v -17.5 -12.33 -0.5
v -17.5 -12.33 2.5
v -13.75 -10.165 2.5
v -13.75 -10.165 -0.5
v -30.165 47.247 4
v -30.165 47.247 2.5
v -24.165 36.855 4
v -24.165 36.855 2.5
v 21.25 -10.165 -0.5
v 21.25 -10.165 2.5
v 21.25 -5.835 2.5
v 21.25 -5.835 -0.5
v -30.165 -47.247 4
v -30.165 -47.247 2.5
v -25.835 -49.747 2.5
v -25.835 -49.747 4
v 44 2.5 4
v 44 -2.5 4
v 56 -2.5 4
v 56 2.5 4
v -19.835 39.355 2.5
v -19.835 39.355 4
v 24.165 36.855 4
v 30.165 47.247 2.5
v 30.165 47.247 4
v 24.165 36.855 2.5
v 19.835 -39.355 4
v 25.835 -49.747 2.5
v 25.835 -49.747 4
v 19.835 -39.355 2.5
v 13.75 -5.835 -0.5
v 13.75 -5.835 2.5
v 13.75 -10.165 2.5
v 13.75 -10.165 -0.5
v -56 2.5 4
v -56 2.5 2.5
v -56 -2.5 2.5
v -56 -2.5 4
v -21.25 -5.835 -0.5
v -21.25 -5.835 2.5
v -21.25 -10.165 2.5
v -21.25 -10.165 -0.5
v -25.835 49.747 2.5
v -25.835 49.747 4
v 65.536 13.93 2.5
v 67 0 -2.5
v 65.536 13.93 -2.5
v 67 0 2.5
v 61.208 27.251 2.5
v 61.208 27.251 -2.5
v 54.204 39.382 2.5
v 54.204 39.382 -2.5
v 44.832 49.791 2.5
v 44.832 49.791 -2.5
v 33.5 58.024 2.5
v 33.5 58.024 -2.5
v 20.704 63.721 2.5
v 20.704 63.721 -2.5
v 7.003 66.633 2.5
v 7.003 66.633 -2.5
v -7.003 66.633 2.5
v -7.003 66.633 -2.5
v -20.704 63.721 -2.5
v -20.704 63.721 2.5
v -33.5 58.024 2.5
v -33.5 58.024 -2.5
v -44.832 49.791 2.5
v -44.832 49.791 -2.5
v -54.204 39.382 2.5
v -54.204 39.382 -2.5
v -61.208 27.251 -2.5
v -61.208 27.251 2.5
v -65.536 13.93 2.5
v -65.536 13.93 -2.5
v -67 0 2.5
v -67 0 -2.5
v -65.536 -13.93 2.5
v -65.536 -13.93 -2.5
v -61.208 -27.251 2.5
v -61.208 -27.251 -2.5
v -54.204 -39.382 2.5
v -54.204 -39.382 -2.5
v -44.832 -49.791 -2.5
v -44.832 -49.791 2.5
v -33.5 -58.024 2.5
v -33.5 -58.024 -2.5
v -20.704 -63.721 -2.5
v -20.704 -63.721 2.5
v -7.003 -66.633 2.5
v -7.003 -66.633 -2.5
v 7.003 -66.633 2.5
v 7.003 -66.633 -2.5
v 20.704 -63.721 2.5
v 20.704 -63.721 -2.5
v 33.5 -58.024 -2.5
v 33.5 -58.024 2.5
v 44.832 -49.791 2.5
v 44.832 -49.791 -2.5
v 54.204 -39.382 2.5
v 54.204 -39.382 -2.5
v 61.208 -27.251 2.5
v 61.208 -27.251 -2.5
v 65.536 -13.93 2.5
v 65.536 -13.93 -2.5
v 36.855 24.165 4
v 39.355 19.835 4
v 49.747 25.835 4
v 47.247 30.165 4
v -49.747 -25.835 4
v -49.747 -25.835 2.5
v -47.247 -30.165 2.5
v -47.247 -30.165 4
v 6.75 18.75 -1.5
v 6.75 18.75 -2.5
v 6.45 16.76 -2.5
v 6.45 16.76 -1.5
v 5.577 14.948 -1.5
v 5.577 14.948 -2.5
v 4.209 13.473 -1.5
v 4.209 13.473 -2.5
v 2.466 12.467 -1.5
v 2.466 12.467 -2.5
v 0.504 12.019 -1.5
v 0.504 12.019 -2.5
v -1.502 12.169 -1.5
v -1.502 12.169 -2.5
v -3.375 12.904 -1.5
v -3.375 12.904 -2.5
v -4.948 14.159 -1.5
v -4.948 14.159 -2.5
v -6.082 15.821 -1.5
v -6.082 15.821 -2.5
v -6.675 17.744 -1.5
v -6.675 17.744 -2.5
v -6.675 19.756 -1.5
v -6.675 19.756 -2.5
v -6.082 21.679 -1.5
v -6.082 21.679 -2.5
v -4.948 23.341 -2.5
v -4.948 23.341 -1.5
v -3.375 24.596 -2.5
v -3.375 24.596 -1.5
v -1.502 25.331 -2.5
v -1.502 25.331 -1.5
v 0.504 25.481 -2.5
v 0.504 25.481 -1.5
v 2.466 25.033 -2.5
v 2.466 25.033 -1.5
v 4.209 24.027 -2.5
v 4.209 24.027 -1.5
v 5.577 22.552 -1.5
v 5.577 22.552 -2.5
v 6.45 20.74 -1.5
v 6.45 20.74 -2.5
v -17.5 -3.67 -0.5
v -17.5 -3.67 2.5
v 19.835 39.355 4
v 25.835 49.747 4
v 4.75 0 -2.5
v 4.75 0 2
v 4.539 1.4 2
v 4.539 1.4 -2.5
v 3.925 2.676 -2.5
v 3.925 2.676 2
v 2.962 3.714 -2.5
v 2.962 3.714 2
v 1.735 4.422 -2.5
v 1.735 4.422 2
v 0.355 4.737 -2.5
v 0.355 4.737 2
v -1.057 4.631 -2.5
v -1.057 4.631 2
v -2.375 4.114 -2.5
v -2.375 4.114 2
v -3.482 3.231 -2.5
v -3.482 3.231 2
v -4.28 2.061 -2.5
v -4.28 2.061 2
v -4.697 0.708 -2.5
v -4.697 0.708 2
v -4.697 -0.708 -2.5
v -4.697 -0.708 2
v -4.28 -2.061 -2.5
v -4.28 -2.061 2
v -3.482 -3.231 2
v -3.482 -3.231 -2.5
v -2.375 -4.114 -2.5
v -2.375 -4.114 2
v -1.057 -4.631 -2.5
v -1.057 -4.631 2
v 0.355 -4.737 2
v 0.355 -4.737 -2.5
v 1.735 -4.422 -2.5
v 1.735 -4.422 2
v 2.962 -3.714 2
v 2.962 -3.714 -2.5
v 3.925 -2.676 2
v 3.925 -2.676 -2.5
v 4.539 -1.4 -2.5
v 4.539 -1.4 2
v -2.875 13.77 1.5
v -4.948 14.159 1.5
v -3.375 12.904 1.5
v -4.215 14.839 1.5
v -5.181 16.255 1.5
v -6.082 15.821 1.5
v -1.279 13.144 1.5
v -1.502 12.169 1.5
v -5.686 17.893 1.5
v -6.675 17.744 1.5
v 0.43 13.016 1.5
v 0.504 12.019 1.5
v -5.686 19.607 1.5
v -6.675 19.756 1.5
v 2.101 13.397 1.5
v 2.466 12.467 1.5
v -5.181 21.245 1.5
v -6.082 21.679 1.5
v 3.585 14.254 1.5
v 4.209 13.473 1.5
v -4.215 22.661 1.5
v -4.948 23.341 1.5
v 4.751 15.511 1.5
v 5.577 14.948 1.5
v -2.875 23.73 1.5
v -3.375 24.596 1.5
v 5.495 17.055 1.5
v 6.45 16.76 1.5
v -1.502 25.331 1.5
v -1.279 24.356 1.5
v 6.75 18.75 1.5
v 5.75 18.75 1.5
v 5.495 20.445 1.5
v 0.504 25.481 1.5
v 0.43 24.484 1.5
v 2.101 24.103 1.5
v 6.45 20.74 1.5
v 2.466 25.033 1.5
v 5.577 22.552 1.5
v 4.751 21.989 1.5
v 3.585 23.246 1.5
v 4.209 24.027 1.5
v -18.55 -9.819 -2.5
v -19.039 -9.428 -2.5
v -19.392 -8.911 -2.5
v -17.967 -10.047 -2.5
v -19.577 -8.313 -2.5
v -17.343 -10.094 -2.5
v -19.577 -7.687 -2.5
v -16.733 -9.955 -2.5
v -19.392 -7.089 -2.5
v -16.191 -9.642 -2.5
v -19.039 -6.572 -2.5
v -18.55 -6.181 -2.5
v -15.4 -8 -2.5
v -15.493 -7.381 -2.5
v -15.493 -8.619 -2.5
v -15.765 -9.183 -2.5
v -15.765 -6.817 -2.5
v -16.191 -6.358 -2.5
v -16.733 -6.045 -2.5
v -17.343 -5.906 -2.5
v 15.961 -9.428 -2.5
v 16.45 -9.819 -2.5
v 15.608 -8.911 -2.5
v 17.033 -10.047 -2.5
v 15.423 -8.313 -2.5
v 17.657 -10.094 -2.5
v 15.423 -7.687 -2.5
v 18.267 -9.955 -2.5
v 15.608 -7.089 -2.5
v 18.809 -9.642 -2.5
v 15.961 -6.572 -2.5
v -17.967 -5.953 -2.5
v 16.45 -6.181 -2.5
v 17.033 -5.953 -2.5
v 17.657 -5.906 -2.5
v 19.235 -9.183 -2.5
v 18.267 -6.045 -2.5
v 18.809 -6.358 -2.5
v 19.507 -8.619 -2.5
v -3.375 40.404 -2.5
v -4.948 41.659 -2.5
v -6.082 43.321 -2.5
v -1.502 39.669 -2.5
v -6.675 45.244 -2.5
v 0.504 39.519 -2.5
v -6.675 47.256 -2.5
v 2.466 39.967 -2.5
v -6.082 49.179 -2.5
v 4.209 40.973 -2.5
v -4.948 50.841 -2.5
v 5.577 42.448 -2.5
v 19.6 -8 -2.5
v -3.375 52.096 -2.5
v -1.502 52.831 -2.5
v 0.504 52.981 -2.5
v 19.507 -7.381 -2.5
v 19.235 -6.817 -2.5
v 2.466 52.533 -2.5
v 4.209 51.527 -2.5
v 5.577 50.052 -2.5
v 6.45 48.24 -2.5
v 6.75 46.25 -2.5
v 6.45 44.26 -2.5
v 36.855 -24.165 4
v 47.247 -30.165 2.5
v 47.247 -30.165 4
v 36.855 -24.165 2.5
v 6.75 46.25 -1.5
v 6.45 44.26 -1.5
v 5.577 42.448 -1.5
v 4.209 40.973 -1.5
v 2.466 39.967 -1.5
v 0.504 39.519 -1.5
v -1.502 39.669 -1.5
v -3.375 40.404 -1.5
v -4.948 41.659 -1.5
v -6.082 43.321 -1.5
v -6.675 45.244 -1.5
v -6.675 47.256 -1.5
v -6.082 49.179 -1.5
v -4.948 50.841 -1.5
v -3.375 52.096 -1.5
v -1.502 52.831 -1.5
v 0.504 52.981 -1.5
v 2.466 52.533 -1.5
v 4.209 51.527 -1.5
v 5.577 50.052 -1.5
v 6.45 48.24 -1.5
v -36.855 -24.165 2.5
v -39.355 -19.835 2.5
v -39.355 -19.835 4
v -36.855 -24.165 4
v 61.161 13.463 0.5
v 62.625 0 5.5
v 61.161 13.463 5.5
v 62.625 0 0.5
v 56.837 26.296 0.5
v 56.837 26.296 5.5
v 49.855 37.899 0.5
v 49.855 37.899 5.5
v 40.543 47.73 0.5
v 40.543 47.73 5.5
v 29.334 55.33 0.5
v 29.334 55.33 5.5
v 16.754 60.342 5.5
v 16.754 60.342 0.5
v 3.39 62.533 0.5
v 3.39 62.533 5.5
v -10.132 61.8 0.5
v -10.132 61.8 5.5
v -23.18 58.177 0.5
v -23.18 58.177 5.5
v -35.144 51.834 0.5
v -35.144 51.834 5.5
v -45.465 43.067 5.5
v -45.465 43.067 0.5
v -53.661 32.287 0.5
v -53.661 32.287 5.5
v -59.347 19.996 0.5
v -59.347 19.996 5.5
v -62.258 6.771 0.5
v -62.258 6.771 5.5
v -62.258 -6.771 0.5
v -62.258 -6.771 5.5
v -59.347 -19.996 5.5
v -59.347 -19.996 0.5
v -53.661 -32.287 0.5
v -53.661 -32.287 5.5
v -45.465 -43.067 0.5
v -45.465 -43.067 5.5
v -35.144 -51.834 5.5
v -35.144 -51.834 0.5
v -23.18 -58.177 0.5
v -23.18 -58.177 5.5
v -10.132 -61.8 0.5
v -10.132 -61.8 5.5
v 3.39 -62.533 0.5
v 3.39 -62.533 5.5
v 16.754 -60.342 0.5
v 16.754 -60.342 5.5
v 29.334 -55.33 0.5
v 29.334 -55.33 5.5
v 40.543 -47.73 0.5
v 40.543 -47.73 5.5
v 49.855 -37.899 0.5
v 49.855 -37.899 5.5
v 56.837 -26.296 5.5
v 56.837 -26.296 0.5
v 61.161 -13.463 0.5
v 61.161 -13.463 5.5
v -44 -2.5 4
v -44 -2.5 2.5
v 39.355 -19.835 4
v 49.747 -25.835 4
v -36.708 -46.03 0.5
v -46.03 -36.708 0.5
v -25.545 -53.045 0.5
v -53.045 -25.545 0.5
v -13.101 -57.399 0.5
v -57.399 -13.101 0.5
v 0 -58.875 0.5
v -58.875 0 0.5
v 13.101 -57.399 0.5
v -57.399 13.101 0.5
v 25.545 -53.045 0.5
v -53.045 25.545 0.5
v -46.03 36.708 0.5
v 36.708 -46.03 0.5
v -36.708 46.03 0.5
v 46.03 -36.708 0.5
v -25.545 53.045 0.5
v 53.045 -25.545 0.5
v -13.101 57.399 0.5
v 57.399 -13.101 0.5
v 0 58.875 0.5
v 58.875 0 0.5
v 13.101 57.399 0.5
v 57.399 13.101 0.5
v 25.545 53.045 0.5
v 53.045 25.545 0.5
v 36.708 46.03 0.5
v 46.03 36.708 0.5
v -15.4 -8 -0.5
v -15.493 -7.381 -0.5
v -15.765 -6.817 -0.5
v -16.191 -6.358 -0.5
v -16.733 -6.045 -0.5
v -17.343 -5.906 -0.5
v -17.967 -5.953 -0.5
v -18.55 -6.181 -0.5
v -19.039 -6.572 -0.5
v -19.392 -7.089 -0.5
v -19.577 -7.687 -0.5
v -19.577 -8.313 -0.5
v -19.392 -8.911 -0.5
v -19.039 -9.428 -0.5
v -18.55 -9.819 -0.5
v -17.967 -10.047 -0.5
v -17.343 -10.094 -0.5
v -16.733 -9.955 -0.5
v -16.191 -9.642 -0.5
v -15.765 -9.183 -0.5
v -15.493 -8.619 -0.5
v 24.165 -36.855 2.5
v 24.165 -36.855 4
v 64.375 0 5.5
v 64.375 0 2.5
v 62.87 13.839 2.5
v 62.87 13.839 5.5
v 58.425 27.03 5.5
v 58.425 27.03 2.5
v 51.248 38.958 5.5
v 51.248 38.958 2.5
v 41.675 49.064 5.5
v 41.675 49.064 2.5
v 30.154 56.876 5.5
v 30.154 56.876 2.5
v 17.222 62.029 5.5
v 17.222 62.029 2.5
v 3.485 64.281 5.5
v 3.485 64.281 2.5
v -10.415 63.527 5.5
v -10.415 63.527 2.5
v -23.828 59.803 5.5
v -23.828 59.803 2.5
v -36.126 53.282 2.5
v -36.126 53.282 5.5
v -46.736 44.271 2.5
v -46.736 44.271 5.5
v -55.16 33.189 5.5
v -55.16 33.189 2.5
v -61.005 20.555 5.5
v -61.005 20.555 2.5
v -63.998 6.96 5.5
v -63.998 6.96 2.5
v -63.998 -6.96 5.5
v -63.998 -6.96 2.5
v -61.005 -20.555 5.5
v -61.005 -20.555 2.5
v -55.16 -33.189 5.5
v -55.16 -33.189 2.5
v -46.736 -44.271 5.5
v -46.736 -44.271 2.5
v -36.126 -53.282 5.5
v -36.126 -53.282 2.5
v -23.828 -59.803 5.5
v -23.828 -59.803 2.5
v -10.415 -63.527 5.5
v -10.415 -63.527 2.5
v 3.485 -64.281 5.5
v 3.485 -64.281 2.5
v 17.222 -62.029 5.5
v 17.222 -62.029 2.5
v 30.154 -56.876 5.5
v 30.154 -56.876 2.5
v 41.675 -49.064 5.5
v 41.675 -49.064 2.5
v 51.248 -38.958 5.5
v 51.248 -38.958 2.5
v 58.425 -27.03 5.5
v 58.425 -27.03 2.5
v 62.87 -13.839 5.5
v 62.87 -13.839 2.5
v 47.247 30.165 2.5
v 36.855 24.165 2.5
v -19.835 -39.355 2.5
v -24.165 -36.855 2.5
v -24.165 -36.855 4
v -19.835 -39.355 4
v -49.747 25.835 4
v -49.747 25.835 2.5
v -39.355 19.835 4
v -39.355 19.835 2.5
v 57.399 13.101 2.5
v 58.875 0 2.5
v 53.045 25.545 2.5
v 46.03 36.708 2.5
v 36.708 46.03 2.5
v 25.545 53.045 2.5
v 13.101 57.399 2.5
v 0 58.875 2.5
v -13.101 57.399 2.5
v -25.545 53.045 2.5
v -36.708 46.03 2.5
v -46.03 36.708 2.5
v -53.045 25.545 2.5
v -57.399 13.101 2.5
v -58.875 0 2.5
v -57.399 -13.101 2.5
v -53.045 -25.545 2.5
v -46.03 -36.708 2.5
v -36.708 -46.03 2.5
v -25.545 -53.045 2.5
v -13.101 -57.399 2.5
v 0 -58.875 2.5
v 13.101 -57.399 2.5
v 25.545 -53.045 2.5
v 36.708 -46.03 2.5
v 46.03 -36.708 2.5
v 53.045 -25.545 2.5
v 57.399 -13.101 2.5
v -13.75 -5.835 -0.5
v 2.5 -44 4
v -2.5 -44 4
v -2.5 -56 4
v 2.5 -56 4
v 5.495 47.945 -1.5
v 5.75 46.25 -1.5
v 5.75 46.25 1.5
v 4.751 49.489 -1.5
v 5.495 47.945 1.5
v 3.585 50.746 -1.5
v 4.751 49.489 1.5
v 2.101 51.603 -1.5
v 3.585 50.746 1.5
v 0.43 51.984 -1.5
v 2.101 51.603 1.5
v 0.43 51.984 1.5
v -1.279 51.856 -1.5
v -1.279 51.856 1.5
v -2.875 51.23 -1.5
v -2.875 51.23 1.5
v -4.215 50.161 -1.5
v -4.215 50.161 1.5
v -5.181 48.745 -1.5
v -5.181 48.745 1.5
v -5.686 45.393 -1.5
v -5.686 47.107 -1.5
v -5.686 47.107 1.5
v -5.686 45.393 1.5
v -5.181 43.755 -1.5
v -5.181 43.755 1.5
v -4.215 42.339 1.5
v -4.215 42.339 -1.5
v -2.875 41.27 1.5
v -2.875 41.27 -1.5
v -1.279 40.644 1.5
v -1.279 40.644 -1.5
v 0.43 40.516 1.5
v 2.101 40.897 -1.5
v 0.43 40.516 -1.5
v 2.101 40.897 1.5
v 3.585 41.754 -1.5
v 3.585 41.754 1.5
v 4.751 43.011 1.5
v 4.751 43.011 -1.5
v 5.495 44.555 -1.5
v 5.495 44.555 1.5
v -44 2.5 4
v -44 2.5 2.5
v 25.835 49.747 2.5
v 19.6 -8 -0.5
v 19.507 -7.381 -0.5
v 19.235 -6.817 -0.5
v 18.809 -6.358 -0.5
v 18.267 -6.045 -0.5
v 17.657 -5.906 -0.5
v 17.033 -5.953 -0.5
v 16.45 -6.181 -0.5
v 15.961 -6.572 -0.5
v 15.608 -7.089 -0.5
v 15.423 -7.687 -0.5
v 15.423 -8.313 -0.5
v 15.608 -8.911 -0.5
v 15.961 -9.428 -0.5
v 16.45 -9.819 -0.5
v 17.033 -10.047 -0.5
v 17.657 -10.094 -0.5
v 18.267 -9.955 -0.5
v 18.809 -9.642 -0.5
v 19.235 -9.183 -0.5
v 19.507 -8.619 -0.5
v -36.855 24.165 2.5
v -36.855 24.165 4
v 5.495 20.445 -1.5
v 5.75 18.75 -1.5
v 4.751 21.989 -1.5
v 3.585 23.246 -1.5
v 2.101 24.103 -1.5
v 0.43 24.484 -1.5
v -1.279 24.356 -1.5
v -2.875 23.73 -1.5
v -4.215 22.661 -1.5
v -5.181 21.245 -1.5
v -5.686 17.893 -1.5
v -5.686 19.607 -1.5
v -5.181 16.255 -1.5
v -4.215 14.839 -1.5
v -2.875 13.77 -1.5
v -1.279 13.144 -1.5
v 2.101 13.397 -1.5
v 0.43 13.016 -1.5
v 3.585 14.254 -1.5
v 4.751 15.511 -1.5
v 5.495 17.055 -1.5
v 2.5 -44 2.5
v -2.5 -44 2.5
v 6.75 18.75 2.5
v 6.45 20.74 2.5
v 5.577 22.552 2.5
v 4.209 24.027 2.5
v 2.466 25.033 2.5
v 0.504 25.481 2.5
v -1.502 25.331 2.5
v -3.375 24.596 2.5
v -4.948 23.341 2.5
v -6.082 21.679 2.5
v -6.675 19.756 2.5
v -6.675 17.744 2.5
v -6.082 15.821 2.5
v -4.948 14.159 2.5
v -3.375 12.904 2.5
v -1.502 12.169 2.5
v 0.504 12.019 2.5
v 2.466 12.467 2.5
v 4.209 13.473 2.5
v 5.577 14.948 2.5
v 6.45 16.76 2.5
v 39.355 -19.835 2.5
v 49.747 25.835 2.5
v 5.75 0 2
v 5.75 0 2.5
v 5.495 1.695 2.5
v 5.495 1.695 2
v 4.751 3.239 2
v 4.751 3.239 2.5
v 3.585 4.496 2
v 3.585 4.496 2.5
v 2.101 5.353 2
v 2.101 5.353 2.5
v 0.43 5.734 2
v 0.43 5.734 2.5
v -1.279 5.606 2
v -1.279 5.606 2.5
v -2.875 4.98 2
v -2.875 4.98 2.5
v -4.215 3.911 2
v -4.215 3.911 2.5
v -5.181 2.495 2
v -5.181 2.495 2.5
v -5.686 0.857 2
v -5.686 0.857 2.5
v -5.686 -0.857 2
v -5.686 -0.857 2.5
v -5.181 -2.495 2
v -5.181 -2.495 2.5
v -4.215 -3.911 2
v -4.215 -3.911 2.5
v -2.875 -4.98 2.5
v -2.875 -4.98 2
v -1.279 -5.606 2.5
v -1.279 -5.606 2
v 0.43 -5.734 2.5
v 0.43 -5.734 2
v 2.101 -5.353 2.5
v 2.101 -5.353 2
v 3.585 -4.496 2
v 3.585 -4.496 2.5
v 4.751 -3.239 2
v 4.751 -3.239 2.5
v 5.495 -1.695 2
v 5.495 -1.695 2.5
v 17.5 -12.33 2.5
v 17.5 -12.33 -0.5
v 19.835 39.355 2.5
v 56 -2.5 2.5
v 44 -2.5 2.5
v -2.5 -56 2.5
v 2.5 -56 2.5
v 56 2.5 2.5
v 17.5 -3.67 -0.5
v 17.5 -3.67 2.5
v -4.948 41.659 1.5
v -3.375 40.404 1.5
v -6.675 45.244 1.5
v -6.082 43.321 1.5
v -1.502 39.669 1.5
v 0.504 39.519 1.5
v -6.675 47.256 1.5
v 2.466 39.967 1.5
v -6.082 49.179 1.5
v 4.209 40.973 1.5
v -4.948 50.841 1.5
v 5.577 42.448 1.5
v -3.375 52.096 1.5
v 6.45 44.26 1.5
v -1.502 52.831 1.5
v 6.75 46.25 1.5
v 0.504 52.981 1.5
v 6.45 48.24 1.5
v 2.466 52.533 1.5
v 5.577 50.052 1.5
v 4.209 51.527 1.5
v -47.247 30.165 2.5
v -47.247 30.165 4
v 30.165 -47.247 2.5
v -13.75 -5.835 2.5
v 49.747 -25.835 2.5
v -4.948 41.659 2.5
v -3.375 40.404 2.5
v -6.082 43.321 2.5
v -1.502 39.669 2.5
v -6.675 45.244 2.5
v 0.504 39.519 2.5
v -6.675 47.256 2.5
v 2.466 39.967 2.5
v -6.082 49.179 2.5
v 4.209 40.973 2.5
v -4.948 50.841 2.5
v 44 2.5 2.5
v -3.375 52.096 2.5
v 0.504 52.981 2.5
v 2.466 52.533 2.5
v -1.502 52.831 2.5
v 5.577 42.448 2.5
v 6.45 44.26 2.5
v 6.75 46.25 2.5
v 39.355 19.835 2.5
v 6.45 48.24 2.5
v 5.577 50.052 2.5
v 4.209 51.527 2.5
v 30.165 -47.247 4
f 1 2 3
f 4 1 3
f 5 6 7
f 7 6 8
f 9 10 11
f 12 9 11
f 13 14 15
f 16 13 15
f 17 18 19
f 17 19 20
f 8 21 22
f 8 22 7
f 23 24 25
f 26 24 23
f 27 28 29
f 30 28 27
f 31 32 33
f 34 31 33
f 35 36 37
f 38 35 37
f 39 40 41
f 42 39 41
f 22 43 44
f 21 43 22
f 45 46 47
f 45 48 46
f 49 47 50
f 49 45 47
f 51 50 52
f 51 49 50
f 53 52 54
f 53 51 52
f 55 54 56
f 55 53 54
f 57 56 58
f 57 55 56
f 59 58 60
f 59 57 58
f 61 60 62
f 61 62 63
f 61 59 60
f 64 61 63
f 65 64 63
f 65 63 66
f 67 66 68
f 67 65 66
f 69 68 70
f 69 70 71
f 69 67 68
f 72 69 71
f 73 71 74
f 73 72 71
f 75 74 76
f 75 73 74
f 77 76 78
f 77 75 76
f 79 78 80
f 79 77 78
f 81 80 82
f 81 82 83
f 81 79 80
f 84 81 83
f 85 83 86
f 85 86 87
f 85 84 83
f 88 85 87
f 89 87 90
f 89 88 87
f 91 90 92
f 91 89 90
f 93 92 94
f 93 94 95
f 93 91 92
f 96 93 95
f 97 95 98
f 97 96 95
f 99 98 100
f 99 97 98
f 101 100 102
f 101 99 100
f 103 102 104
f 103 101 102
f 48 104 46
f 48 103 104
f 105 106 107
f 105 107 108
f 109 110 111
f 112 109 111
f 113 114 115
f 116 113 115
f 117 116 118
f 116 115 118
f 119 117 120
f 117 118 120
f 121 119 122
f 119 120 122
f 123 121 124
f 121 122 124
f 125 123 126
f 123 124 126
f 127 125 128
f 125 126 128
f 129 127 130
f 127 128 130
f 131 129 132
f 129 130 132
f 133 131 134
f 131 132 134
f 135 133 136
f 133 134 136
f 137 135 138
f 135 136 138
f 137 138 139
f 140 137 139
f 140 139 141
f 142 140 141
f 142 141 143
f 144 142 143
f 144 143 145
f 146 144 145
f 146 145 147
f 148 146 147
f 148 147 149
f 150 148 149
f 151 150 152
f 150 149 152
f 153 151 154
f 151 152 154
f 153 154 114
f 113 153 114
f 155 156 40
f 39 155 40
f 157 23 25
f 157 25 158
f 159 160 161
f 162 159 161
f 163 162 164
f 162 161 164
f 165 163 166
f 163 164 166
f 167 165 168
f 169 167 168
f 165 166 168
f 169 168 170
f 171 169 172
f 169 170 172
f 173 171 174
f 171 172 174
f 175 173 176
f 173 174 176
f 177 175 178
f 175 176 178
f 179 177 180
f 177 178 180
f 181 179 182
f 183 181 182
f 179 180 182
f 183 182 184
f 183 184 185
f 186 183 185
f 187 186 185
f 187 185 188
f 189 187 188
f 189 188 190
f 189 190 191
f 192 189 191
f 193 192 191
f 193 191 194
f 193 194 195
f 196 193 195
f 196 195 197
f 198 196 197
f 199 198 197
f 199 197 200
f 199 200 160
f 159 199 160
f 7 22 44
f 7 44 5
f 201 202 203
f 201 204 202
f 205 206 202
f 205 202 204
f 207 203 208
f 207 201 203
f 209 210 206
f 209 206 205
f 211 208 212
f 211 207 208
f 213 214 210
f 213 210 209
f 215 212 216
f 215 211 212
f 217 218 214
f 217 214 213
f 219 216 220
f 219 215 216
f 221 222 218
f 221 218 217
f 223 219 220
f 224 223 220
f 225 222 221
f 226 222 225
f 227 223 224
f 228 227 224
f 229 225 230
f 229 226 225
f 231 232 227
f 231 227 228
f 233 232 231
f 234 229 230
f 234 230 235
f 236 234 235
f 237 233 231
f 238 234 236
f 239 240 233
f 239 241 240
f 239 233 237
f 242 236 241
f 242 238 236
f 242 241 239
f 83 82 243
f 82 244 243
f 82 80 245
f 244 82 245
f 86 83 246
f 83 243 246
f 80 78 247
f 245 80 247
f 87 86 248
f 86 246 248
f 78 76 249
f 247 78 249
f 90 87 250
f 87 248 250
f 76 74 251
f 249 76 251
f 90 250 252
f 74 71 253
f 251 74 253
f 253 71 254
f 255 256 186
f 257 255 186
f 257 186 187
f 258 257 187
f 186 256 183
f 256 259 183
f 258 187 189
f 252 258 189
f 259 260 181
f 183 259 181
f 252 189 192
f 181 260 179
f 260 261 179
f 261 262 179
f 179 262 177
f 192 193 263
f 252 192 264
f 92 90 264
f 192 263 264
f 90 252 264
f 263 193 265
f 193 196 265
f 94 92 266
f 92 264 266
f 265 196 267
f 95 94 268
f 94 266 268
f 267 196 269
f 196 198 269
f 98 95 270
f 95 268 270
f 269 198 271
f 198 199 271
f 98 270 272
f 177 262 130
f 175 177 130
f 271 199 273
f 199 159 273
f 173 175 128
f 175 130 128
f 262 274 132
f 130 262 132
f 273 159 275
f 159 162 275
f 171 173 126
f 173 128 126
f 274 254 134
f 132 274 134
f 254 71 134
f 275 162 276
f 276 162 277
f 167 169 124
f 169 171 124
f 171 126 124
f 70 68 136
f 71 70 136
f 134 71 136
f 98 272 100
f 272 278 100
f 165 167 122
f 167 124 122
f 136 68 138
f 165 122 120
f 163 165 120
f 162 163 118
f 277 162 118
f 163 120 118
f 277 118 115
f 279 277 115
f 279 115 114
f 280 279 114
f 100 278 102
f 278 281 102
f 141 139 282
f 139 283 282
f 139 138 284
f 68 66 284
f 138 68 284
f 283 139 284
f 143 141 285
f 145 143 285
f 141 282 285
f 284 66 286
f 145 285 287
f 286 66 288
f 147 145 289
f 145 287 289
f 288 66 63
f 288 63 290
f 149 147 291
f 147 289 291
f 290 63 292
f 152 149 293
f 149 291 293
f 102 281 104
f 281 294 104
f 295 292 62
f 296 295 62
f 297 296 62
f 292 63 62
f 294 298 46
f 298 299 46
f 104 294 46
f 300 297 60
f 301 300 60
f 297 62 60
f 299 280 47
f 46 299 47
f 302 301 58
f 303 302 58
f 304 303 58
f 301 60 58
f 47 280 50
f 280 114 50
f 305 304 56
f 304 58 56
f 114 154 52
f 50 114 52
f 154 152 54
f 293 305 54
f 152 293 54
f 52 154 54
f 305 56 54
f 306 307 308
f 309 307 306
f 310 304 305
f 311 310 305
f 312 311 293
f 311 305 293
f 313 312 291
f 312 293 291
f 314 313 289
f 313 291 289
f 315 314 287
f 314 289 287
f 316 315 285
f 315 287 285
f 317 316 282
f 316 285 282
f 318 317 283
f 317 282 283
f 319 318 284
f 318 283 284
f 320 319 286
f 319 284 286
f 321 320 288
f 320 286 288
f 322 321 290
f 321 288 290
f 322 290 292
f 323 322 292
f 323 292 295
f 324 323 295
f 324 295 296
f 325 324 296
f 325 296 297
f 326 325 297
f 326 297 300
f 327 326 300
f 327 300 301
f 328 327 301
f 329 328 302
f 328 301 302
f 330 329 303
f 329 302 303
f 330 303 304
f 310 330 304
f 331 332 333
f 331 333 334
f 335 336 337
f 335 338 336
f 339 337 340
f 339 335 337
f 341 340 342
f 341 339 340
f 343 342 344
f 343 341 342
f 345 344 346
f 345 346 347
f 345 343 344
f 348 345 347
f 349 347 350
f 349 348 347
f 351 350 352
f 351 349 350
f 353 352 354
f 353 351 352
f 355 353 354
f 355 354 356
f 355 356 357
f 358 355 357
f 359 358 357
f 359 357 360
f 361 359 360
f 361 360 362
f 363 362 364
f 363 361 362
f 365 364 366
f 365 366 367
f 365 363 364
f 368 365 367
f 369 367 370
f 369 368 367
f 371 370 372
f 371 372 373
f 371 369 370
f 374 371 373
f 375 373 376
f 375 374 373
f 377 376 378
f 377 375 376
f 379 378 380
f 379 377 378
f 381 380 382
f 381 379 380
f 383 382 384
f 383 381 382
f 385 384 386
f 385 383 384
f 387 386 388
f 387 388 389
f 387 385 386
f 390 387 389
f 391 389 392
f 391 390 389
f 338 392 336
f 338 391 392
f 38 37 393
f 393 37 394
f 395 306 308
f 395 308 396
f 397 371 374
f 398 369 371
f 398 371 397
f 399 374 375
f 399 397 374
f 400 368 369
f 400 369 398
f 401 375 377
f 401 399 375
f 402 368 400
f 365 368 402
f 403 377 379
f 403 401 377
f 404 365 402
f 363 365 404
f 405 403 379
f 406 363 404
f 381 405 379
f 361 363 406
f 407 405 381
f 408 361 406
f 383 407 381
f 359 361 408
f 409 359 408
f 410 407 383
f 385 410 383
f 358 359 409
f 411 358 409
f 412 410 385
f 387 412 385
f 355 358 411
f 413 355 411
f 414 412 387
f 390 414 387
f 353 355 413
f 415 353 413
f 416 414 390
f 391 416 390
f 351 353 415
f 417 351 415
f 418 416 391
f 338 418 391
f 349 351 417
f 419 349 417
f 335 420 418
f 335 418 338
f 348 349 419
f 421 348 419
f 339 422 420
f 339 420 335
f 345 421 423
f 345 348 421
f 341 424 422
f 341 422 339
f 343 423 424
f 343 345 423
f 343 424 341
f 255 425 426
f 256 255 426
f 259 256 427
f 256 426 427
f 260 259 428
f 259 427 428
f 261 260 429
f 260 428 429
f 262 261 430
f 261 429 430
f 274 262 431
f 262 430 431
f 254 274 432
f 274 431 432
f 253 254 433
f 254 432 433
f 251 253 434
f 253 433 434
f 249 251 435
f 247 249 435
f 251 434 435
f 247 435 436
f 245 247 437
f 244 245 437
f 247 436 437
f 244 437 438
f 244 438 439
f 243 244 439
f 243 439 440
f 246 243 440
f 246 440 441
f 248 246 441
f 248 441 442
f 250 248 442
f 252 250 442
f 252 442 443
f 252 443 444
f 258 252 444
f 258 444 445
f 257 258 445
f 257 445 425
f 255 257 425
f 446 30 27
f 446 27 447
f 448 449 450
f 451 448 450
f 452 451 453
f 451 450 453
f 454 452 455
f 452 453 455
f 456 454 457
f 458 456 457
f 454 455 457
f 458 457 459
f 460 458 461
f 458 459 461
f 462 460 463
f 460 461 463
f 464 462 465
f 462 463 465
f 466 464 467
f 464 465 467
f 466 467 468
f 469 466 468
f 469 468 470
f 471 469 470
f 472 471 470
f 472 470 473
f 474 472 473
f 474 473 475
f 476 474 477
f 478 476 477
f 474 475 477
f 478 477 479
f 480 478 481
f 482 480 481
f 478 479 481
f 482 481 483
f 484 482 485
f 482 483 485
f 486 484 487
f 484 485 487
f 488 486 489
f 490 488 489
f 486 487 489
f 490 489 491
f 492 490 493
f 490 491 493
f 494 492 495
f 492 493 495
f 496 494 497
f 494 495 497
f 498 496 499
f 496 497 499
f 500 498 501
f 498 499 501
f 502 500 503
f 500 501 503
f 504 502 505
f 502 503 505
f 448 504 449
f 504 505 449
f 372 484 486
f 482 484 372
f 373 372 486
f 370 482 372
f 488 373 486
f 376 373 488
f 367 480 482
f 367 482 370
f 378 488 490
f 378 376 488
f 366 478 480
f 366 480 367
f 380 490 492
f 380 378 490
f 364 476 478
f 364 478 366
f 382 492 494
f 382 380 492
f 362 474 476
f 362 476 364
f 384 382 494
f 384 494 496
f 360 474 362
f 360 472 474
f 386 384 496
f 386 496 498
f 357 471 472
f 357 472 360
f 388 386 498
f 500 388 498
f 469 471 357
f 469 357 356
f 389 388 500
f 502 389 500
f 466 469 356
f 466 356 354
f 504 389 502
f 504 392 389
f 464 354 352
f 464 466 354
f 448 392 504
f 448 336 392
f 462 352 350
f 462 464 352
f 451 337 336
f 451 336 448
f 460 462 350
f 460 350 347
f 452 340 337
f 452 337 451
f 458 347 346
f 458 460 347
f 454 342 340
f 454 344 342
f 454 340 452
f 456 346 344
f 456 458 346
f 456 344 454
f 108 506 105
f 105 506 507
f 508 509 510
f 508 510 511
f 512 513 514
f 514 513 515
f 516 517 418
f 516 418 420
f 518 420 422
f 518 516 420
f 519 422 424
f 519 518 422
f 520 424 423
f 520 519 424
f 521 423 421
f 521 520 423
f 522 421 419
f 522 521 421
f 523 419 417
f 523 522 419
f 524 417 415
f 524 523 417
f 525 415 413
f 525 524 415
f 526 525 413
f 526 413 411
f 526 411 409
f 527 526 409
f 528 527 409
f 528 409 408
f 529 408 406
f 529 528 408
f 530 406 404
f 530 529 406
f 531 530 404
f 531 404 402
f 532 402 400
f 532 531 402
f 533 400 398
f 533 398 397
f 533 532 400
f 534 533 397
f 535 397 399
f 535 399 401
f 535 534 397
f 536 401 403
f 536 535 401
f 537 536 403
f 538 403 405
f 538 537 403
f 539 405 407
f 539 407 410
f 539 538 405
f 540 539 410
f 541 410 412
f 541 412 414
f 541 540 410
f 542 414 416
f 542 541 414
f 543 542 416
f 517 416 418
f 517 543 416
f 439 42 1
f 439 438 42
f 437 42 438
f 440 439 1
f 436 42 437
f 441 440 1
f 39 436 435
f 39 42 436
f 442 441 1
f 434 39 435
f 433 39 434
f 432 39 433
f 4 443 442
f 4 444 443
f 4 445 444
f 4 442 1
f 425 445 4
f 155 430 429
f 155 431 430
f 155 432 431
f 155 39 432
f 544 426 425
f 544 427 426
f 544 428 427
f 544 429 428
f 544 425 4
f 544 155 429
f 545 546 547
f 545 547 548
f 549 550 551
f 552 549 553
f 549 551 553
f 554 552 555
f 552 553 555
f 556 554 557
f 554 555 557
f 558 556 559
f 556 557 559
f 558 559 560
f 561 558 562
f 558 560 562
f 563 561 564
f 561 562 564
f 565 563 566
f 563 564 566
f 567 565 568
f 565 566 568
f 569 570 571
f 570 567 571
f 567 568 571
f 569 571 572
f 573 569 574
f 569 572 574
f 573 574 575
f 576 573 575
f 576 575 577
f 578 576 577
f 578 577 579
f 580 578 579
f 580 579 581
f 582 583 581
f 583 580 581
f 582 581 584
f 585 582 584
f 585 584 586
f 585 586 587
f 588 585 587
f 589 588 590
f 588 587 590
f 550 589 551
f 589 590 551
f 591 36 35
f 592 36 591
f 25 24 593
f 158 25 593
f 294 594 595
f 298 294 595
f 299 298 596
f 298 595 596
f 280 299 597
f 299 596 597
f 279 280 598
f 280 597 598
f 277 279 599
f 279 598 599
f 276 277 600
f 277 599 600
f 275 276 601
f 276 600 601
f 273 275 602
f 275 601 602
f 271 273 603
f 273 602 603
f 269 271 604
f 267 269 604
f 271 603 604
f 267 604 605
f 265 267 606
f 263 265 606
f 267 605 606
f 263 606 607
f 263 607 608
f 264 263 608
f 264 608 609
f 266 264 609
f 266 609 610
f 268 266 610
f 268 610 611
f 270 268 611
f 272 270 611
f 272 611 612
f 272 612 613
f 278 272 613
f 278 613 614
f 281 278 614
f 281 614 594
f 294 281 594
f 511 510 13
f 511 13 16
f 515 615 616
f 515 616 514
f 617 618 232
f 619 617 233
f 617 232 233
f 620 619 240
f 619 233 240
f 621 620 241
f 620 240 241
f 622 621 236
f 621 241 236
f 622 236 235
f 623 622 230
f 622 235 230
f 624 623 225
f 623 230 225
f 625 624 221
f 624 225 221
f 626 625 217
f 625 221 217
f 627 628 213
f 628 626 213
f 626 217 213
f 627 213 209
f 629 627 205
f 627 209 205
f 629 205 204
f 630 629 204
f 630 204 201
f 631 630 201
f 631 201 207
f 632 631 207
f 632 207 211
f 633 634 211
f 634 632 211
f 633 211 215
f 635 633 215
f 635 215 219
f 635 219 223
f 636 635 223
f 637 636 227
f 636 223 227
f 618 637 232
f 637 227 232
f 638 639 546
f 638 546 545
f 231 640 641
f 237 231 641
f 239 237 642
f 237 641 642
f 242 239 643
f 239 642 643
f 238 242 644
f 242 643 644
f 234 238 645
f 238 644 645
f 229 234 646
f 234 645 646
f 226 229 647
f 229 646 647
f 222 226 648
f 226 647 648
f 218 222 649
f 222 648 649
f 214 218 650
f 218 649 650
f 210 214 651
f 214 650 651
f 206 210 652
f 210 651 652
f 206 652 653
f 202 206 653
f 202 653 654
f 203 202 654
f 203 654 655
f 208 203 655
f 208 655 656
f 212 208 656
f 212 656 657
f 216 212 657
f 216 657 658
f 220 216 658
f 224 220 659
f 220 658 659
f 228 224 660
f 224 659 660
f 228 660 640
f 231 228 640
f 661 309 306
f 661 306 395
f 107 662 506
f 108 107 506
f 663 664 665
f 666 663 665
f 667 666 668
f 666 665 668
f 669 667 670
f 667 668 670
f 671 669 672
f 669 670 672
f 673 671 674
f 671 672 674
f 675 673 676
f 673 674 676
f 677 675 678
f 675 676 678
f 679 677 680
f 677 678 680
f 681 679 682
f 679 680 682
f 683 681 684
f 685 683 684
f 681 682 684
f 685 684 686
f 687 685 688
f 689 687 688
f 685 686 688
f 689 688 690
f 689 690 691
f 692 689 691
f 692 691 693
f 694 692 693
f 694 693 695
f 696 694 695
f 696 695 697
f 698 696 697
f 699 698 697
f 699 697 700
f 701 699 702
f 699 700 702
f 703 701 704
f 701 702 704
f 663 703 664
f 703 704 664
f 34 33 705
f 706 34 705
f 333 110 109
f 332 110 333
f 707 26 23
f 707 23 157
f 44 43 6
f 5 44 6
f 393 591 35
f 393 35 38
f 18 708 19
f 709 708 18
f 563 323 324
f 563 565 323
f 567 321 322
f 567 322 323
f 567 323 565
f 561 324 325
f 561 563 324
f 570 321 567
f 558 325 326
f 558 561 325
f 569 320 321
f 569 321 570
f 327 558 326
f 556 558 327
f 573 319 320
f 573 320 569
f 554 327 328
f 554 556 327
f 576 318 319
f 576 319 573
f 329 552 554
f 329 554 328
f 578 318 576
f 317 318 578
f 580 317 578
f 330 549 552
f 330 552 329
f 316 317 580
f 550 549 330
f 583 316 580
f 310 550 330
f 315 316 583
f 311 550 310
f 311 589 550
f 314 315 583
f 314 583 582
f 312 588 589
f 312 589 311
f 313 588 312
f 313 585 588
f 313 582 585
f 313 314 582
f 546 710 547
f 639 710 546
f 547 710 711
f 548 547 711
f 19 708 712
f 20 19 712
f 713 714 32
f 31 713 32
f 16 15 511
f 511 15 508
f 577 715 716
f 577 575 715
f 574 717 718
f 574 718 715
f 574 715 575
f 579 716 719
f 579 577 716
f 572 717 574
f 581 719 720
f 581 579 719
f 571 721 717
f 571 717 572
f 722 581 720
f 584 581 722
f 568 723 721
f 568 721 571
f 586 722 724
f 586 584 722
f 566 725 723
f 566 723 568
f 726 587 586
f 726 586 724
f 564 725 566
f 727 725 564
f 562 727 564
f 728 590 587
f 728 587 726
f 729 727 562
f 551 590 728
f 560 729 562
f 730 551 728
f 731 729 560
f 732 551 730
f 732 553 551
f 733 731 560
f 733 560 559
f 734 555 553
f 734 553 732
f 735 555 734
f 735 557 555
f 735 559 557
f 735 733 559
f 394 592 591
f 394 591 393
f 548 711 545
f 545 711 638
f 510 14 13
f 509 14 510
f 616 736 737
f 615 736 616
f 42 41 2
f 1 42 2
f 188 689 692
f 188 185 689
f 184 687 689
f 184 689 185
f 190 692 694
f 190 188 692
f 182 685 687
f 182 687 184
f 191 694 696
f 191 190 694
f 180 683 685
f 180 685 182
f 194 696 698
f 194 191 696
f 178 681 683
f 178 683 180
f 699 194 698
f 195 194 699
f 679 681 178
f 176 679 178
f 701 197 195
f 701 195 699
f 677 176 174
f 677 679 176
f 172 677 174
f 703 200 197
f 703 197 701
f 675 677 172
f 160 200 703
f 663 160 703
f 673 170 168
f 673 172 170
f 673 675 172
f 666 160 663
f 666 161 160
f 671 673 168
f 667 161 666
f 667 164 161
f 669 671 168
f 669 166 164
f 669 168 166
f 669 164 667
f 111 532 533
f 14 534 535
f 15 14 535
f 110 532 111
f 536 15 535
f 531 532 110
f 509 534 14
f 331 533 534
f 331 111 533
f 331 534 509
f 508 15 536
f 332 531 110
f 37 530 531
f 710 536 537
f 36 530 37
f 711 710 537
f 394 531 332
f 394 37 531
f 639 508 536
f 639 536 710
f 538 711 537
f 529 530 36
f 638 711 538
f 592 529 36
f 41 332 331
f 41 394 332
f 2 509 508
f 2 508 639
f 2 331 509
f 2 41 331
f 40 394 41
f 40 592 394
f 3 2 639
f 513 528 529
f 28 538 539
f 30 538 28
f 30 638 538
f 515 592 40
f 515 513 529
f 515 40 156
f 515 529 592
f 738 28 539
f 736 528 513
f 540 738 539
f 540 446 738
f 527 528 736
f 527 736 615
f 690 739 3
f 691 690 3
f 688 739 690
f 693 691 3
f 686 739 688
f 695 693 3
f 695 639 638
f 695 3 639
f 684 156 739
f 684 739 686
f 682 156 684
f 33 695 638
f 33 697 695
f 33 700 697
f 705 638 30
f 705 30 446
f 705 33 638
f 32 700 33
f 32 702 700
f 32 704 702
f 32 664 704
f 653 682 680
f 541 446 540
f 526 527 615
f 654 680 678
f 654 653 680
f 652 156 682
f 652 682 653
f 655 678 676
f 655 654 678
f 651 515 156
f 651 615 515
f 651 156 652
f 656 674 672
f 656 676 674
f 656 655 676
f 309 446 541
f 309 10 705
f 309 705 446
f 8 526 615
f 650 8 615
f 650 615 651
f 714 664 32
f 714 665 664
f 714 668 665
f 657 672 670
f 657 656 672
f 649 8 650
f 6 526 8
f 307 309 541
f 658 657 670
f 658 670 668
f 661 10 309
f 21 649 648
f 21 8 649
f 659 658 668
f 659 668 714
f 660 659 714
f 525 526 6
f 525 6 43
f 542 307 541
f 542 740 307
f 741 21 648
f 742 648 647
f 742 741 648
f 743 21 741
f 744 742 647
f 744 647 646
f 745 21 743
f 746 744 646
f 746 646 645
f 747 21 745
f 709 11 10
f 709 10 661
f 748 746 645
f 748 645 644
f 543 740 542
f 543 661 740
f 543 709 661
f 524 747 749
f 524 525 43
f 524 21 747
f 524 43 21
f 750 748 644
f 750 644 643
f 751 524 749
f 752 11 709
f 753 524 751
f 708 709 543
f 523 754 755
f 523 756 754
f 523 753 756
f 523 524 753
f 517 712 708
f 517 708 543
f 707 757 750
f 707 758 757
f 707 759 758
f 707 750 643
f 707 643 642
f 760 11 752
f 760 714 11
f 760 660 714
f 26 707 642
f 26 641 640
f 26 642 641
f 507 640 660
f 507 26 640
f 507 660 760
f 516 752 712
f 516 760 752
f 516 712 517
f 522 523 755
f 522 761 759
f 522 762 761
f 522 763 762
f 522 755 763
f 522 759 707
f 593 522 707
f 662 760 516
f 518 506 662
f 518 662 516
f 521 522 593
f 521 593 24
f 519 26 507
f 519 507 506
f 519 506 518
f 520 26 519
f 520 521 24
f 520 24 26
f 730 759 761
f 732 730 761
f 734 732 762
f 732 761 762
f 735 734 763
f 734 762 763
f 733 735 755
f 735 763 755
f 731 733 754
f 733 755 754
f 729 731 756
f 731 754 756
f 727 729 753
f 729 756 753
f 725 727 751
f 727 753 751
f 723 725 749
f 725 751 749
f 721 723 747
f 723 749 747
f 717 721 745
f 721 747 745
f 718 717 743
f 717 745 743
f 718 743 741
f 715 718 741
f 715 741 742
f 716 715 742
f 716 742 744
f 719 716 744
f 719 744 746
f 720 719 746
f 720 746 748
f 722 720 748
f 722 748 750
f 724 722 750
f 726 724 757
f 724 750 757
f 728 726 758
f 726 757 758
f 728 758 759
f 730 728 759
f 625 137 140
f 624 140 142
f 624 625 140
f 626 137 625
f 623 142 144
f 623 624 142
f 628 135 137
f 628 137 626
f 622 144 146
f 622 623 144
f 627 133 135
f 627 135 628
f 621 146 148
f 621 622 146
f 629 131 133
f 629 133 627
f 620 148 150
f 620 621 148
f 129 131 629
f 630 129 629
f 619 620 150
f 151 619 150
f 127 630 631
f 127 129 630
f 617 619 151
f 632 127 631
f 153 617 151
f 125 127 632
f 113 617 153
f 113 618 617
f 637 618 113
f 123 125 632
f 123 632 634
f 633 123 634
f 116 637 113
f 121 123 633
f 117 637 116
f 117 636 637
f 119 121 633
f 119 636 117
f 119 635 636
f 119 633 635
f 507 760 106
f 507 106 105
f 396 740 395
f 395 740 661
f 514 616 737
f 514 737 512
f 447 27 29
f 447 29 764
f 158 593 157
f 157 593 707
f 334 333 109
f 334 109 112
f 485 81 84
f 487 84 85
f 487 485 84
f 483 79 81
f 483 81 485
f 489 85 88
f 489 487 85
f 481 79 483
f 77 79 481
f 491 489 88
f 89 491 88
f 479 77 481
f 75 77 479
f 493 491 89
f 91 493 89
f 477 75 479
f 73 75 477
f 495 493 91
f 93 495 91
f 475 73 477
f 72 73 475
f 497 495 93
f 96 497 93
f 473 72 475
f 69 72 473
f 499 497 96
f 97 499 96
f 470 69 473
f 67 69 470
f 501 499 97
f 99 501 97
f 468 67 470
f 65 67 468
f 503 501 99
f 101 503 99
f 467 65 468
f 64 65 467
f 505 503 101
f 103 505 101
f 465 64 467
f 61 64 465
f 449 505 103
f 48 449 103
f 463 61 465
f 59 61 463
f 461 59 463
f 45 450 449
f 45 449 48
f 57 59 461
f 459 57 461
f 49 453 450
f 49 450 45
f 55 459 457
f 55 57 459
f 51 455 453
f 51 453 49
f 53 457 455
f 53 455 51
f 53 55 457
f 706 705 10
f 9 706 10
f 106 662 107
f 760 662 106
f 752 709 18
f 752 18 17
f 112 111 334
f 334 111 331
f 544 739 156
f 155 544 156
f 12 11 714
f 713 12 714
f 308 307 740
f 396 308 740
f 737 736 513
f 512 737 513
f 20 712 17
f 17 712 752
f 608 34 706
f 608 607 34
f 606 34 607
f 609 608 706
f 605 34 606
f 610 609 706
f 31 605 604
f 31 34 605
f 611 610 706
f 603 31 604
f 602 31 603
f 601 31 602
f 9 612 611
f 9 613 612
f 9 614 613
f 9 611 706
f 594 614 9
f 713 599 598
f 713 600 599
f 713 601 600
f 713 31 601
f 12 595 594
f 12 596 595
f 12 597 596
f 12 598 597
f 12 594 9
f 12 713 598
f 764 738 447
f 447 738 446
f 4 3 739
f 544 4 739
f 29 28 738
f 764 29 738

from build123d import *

# Parameters (mm, degrees)
F0_R              = 67
F1_DEPTH          = 2.5
F2_R              = 64.375
F2_R_2            = 62.625
F3_DEPTH          = 3
F2_R_3            = 58.875
F4_DEPTH          = 2
F5_R              = 4.75
F5_R_2            = 5.75
F5_R_3            = 2.1
F6_DEPTH          = 25
F7_R              = 5.75
F7_R_2            = 4.75
F8_DEPTH          = 0.5
F7_R_3            = 6.75
F9_DEPTH          = 1
F7_R_4            = 2.1
F10_DEPTH         = 3
F11_R             = 6.75
F11_R_2           = 5.75
F12_DEPTH         = 1
F13_W             = 5
F13_H             = 12
F14_DEPTH         = 1.5
F14_COPIES_COUNT  = 6
F14_COPIES_ANGLE  = 150
F14_COPIES1_COUNT = 6
F14_COPIES1_ANGLE = 150


# Not quite as in the source:
# - a feature of the source that left no trace in its solid (it failed there, or was rolled back) is left out
# - a pattern or mirror of a feature is missing from the dataset's text; its kind, count and spacing are read off the source's solid


with BuildPart() as f1:
    # F0 (on Top) → F1 (new body, symmetric)
    with BuildSketch(Plane.XY):
        Circle(F0_R)
    extrude(amount=F1_DEPTH, both=True)

    # F2 (on face) → F3 (join)
    with BuildSketch(Plane.XY.offset(2.5)):
        Circle(F2_R)
        Circle(F2_R_2, mode=Mode.SUBTRACT)
    extrude(amount=F3_DEPTH)

    # F2 (on face) → F4 (cut)
    with BuildSketch(Plane.XY.offset(2.5)):
        Circle(F2_R_2)
        Circle(F2_R_3, mode=Mode.SUBTRACT)
    extrude(amount=-F4_DEPTH, mode=Mode.SUBTRACT)

    # F5 (on face) → F6 (cut)
    with BuildSketch(Plane.XY.offset(2.5)):
        Circle(F5_R)
        with Locations((0, 18.75)):
            Circle(F5_R_2)
        with Locations((0, 46.25)):
            Circle(F5_R_2)
        with Locations((17.5, -8)):
            Circle(F5_R_3)
        with Locations((-17.5, -8)):
            Circle(F5_R_3)
    extrude(amount=-F6_DEPTH, mode=Mode.SUBTRACT)

    # F7 (on face) → F8 (cut)
    with BuildSketch(Plane.XY.offset(2.5)):
        Circle(F7_R)
        Circle(F7_R_2, mode=Mode.SUBTRACT)
    extrude(amount=-F8_DEPTH, mode=Mode.SUBTRACT)

    # F7 (on face) → F9 (cut)
    with BuildSketch(Plane.XY.offset(2.5)):
        with Locations((0, 18.75)):
            Circle(F7_R_3)
        with Locations((0, 18.75)):
            Circle(F7_R, mode=Mode.SUBTRACT)
        with Locations((0, 46.25)):
            Circle(F7_R_3)
        with Locations((0, 46.25)):
            Circle(F7_R, mode=Mode.SUBTRACT)
    extrude(amount=-F9_DEPTH, mode=Mode.SUBTRACT)

    # F7 (on face) → F10 (cut)
    with BuildSketch(Plane.XY.offset(2.5)):
        Polygon((-13.75, -10.1650635095), (-13.75, -5.8349364905), (-17.5, -3.6698729811), (-21.25, -5.8349364905), (-21.25, -10.1650635095), (-17.5, -12.3301270189), align=None)
        with Locations((-17.5, -8)):
            Circle(F7_R_4, mode=Mode.SUBTRACT)
        Polygon((21.25, -10.1650635095), (21.25, -5.8349364905), (17.5, -3.6698729811), (13.75, -5.8349364905), (13.75, -10.1650635095), (17.5, -12.3301270189), align=None)
        with Locations((17.5, -8)):
            Circle(F7_R_4, mode=Mode.SUBTRACT)
    extrude(amount=-F10_DEPTH, mode=Mode.SUBTRACT)

    # F11 (on face) → F12 (cut)
    with BuildSketch(Plane(origin=(0, 0, -2.5), x_dir=(1, 0, 0), z_dir=(0, 0, -1))):
        with Locations((0, -18.75)):
            Circle(F11_R)
        with Locations((0, -18.75)):
            Circle(F11_R_2, mode=Mode.SUBTRACT)
        with Locations((0, -46.25)):
            Circle(F11_R)
        with Locations((0, -46.25)):
            Circle(F11_R_2, mode=Mode.SUBTRACT)
    extrude(amount=-F12_DEPTH, mode=Mode.SUBTRACT)

    # F13 (on face) → F14 (join)
    with BuildSketch(Plane.XY.offset(2.5)):
        with Locations((0, -50)):
            Rectangle(F13_W, F13_H)
    f14 = extrude(amount=F14_DEPTH)

    # F14_copies: F14 ×6 about axis
    f14_copies_axis = Axis((0, 0, 0), (0, 0, 1))
    for i in range(1, F14_COPIES_COUNT):
        add(f14.rotate(f14_copies_axis, i * F14_COPIES_ANGLE / (F14_COPIES_COUNT - 1)))

    # F14_copies1: F14 ×6 about axis
    f14_copies1_axis = Axis((0, 0, 0), (0, 0, -1))
    for i in range(1, F14_COPIES1_COUNT):
        add(f14.rotate(f14_copies1_axis, i * F14_COPIES1_ANGLE / (F14_COPIES1_COUNT - 1)))


solid = f1.part
